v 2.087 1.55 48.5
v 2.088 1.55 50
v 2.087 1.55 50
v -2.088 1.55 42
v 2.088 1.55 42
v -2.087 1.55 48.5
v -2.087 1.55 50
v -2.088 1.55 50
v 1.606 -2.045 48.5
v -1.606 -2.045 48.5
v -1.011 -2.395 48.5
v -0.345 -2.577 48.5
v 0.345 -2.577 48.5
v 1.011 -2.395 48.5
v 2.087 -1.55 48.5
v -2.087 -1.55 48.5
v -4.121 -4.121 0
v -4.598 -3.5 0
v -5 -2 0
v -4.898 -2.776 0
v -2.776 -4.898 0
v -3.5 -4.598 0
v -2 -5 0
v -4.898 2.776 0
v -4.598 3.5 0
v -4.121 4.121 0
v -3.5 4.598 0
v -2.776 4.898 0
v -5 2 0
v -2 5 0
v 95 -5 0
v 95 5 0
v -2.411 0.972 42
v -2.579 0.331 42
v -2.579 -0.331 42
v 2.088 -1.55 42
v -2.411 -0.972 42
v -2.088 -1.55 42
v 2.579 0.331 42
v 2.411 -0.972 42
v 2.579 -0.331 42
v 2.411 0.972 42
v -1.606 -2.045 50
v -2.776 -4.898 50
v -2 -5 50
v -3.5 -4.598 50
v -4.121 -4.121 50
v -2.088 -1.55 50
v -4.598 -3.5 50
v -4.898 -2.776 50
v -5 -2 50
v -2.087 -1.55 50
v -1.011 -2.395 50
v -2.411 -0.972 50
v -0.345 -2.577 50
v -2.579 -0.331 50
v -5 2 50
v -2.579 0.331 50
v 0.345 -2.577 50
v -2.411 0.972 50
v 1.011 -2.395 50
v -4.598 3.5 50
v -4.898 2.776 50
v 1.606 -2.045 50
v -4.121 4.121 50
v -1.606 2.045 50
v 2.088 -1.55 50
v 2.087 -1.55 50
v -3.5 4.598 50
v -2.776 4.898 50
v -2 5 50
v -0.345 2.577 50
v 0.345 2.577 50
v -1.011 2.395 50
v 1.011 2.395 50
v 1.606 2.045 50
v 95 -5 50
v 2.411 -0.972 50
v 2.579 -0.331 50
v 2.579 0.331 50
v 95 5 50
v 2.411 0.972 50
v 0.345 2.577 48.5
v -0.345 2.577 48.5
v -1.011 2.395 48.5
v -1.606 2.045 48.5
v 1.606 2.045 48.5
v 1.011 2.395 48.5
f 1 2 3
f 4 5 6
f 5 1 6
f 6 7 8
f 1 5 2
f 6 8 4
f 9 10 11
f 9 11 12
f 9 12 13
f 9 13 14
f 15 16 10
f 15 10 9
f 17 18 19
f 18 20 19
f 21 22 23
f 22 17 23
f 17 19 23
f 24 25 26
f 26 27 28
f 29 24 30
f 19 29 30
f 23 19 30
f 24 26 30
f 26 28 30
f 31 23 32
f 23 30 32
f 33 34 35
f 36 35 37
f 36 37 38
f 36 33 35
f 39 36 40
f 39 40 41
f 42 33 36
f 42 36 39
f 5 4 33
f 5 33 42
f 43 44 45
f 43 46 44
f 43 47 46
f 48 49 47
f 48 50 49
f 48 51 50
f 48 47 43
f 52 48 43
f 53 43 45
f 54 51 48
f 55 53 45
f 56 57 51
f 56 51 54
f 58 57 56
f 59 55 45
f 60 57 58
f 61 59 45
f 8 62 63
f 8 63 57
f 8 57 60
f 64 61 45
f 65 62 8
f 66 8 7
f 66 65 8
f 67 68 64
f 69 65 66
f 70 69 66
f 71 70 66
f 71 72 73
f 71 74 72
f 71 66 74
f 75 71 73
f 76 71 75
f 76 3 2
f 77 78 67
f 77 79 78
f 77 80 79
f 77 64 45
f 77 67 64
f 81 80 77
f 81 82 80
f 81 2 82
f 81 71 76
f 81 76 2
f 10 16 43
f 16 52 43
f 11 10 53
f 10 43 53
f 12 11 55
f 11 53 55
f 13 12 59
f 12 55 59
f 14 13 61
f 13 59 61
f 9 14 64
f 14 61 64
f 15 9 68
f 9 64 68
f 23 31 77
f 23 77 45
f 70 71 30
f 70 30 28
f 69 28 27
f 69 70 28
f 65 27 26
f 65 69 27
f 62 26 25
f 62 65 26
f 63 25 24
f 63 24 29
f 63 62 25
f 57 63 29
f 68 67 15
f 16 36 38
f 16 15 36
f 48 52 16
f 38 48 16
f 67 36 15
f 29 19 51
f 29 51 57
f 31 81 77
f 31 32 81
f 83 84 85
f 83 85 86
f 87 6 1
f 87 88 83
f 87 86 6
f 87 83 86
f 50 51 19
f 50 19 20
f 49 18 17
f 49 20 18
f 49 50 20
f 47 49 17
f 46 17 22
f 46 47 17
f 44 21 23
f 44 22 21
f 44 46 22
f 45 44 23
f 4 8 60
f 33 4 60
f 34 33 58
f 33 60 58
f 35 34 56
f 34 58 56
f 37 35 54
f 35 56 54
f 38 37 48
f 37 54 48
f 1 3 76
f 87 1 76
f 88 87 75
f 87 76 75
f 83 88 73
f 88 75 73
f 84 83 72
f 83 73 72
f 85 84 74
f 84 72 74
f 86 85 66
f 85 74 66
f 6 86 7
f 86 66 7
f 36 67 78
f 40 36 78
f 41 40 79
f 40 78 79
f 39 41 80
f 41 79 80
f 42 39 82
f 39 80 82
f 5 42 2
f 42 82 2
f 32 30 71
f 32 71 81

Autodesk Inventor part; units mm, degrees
ref_plane "YZ Plane" through (0, 0, 0) normal (1, 0, 0) x (0, 1, 0)
ref_plane "XZ Plane" through (0, 0, 0) normal (0, 1, 0) x (-1, 0, 0)
ref_plane "XY Plane" through (0, 0, 0) normal (0, 0, 1) x (1, 0, 0)
sketch "Sketch1" plane through (0, 0, 0) normal (0, 0, 1) x (1, 0, 0)
  line L0 (-5, 5) -> (95, 5)
  line L1 (95, 5) -> (95, -5)
  line L2 (95, -5) -> (-5, -5)
  line L3 (-5, -5) -> (-5, 5)
  line L4 (0, 0) -> (0, 5) construction
  line L5 (0, 0) -> (0, -5) construction
  line L6 (0, 0) -> (-5, 0) construction
  dimension "d0" = 100
  dimension "d1" = 10
extrude "Extrusion1" add sketch "Sketch1" along normal blind 50
fillet "Fillet1" radius 3 2 edges at (-5, -5, 25) (-5, 5, 25)
sketch "Sketch2" plane through (0, 0, 50) normal (0, 0, 1) x (1, 0, 0)
  line L0 (2.0875, -1.55) -> (-2.0875, -1.55)
  line L1 (2.0875, 1.55) -> (-2.0875, 1.55)
  arc A0 (2.0875, -1.55) -> (2.0875, 1.55) centre (0, 0) ccw
  arc A1 (-2.0875, 1.55) -> (-2.0875, -1.55) centre (0, 0) ccw
  point P0 (2.6, 0)
  point P1 (-2.6, 0)
  dimension "d9" = 2.6
  dimension "d10" = 3.1
extrude "Extrusion2" cut sketch "Sketch2" against normal blind 8
sketch "Sketch3" plane through (0, 0, 50) normal (0, 0, 1) x (1, 0, 0)
  circle A0 centre (0, 0) radius 2.6
  dimension "d13" = 5.2
extrude "Extrusion3" cut sketch "Sketch3" against normal blind 1.5
properties part number "13042025-02"
